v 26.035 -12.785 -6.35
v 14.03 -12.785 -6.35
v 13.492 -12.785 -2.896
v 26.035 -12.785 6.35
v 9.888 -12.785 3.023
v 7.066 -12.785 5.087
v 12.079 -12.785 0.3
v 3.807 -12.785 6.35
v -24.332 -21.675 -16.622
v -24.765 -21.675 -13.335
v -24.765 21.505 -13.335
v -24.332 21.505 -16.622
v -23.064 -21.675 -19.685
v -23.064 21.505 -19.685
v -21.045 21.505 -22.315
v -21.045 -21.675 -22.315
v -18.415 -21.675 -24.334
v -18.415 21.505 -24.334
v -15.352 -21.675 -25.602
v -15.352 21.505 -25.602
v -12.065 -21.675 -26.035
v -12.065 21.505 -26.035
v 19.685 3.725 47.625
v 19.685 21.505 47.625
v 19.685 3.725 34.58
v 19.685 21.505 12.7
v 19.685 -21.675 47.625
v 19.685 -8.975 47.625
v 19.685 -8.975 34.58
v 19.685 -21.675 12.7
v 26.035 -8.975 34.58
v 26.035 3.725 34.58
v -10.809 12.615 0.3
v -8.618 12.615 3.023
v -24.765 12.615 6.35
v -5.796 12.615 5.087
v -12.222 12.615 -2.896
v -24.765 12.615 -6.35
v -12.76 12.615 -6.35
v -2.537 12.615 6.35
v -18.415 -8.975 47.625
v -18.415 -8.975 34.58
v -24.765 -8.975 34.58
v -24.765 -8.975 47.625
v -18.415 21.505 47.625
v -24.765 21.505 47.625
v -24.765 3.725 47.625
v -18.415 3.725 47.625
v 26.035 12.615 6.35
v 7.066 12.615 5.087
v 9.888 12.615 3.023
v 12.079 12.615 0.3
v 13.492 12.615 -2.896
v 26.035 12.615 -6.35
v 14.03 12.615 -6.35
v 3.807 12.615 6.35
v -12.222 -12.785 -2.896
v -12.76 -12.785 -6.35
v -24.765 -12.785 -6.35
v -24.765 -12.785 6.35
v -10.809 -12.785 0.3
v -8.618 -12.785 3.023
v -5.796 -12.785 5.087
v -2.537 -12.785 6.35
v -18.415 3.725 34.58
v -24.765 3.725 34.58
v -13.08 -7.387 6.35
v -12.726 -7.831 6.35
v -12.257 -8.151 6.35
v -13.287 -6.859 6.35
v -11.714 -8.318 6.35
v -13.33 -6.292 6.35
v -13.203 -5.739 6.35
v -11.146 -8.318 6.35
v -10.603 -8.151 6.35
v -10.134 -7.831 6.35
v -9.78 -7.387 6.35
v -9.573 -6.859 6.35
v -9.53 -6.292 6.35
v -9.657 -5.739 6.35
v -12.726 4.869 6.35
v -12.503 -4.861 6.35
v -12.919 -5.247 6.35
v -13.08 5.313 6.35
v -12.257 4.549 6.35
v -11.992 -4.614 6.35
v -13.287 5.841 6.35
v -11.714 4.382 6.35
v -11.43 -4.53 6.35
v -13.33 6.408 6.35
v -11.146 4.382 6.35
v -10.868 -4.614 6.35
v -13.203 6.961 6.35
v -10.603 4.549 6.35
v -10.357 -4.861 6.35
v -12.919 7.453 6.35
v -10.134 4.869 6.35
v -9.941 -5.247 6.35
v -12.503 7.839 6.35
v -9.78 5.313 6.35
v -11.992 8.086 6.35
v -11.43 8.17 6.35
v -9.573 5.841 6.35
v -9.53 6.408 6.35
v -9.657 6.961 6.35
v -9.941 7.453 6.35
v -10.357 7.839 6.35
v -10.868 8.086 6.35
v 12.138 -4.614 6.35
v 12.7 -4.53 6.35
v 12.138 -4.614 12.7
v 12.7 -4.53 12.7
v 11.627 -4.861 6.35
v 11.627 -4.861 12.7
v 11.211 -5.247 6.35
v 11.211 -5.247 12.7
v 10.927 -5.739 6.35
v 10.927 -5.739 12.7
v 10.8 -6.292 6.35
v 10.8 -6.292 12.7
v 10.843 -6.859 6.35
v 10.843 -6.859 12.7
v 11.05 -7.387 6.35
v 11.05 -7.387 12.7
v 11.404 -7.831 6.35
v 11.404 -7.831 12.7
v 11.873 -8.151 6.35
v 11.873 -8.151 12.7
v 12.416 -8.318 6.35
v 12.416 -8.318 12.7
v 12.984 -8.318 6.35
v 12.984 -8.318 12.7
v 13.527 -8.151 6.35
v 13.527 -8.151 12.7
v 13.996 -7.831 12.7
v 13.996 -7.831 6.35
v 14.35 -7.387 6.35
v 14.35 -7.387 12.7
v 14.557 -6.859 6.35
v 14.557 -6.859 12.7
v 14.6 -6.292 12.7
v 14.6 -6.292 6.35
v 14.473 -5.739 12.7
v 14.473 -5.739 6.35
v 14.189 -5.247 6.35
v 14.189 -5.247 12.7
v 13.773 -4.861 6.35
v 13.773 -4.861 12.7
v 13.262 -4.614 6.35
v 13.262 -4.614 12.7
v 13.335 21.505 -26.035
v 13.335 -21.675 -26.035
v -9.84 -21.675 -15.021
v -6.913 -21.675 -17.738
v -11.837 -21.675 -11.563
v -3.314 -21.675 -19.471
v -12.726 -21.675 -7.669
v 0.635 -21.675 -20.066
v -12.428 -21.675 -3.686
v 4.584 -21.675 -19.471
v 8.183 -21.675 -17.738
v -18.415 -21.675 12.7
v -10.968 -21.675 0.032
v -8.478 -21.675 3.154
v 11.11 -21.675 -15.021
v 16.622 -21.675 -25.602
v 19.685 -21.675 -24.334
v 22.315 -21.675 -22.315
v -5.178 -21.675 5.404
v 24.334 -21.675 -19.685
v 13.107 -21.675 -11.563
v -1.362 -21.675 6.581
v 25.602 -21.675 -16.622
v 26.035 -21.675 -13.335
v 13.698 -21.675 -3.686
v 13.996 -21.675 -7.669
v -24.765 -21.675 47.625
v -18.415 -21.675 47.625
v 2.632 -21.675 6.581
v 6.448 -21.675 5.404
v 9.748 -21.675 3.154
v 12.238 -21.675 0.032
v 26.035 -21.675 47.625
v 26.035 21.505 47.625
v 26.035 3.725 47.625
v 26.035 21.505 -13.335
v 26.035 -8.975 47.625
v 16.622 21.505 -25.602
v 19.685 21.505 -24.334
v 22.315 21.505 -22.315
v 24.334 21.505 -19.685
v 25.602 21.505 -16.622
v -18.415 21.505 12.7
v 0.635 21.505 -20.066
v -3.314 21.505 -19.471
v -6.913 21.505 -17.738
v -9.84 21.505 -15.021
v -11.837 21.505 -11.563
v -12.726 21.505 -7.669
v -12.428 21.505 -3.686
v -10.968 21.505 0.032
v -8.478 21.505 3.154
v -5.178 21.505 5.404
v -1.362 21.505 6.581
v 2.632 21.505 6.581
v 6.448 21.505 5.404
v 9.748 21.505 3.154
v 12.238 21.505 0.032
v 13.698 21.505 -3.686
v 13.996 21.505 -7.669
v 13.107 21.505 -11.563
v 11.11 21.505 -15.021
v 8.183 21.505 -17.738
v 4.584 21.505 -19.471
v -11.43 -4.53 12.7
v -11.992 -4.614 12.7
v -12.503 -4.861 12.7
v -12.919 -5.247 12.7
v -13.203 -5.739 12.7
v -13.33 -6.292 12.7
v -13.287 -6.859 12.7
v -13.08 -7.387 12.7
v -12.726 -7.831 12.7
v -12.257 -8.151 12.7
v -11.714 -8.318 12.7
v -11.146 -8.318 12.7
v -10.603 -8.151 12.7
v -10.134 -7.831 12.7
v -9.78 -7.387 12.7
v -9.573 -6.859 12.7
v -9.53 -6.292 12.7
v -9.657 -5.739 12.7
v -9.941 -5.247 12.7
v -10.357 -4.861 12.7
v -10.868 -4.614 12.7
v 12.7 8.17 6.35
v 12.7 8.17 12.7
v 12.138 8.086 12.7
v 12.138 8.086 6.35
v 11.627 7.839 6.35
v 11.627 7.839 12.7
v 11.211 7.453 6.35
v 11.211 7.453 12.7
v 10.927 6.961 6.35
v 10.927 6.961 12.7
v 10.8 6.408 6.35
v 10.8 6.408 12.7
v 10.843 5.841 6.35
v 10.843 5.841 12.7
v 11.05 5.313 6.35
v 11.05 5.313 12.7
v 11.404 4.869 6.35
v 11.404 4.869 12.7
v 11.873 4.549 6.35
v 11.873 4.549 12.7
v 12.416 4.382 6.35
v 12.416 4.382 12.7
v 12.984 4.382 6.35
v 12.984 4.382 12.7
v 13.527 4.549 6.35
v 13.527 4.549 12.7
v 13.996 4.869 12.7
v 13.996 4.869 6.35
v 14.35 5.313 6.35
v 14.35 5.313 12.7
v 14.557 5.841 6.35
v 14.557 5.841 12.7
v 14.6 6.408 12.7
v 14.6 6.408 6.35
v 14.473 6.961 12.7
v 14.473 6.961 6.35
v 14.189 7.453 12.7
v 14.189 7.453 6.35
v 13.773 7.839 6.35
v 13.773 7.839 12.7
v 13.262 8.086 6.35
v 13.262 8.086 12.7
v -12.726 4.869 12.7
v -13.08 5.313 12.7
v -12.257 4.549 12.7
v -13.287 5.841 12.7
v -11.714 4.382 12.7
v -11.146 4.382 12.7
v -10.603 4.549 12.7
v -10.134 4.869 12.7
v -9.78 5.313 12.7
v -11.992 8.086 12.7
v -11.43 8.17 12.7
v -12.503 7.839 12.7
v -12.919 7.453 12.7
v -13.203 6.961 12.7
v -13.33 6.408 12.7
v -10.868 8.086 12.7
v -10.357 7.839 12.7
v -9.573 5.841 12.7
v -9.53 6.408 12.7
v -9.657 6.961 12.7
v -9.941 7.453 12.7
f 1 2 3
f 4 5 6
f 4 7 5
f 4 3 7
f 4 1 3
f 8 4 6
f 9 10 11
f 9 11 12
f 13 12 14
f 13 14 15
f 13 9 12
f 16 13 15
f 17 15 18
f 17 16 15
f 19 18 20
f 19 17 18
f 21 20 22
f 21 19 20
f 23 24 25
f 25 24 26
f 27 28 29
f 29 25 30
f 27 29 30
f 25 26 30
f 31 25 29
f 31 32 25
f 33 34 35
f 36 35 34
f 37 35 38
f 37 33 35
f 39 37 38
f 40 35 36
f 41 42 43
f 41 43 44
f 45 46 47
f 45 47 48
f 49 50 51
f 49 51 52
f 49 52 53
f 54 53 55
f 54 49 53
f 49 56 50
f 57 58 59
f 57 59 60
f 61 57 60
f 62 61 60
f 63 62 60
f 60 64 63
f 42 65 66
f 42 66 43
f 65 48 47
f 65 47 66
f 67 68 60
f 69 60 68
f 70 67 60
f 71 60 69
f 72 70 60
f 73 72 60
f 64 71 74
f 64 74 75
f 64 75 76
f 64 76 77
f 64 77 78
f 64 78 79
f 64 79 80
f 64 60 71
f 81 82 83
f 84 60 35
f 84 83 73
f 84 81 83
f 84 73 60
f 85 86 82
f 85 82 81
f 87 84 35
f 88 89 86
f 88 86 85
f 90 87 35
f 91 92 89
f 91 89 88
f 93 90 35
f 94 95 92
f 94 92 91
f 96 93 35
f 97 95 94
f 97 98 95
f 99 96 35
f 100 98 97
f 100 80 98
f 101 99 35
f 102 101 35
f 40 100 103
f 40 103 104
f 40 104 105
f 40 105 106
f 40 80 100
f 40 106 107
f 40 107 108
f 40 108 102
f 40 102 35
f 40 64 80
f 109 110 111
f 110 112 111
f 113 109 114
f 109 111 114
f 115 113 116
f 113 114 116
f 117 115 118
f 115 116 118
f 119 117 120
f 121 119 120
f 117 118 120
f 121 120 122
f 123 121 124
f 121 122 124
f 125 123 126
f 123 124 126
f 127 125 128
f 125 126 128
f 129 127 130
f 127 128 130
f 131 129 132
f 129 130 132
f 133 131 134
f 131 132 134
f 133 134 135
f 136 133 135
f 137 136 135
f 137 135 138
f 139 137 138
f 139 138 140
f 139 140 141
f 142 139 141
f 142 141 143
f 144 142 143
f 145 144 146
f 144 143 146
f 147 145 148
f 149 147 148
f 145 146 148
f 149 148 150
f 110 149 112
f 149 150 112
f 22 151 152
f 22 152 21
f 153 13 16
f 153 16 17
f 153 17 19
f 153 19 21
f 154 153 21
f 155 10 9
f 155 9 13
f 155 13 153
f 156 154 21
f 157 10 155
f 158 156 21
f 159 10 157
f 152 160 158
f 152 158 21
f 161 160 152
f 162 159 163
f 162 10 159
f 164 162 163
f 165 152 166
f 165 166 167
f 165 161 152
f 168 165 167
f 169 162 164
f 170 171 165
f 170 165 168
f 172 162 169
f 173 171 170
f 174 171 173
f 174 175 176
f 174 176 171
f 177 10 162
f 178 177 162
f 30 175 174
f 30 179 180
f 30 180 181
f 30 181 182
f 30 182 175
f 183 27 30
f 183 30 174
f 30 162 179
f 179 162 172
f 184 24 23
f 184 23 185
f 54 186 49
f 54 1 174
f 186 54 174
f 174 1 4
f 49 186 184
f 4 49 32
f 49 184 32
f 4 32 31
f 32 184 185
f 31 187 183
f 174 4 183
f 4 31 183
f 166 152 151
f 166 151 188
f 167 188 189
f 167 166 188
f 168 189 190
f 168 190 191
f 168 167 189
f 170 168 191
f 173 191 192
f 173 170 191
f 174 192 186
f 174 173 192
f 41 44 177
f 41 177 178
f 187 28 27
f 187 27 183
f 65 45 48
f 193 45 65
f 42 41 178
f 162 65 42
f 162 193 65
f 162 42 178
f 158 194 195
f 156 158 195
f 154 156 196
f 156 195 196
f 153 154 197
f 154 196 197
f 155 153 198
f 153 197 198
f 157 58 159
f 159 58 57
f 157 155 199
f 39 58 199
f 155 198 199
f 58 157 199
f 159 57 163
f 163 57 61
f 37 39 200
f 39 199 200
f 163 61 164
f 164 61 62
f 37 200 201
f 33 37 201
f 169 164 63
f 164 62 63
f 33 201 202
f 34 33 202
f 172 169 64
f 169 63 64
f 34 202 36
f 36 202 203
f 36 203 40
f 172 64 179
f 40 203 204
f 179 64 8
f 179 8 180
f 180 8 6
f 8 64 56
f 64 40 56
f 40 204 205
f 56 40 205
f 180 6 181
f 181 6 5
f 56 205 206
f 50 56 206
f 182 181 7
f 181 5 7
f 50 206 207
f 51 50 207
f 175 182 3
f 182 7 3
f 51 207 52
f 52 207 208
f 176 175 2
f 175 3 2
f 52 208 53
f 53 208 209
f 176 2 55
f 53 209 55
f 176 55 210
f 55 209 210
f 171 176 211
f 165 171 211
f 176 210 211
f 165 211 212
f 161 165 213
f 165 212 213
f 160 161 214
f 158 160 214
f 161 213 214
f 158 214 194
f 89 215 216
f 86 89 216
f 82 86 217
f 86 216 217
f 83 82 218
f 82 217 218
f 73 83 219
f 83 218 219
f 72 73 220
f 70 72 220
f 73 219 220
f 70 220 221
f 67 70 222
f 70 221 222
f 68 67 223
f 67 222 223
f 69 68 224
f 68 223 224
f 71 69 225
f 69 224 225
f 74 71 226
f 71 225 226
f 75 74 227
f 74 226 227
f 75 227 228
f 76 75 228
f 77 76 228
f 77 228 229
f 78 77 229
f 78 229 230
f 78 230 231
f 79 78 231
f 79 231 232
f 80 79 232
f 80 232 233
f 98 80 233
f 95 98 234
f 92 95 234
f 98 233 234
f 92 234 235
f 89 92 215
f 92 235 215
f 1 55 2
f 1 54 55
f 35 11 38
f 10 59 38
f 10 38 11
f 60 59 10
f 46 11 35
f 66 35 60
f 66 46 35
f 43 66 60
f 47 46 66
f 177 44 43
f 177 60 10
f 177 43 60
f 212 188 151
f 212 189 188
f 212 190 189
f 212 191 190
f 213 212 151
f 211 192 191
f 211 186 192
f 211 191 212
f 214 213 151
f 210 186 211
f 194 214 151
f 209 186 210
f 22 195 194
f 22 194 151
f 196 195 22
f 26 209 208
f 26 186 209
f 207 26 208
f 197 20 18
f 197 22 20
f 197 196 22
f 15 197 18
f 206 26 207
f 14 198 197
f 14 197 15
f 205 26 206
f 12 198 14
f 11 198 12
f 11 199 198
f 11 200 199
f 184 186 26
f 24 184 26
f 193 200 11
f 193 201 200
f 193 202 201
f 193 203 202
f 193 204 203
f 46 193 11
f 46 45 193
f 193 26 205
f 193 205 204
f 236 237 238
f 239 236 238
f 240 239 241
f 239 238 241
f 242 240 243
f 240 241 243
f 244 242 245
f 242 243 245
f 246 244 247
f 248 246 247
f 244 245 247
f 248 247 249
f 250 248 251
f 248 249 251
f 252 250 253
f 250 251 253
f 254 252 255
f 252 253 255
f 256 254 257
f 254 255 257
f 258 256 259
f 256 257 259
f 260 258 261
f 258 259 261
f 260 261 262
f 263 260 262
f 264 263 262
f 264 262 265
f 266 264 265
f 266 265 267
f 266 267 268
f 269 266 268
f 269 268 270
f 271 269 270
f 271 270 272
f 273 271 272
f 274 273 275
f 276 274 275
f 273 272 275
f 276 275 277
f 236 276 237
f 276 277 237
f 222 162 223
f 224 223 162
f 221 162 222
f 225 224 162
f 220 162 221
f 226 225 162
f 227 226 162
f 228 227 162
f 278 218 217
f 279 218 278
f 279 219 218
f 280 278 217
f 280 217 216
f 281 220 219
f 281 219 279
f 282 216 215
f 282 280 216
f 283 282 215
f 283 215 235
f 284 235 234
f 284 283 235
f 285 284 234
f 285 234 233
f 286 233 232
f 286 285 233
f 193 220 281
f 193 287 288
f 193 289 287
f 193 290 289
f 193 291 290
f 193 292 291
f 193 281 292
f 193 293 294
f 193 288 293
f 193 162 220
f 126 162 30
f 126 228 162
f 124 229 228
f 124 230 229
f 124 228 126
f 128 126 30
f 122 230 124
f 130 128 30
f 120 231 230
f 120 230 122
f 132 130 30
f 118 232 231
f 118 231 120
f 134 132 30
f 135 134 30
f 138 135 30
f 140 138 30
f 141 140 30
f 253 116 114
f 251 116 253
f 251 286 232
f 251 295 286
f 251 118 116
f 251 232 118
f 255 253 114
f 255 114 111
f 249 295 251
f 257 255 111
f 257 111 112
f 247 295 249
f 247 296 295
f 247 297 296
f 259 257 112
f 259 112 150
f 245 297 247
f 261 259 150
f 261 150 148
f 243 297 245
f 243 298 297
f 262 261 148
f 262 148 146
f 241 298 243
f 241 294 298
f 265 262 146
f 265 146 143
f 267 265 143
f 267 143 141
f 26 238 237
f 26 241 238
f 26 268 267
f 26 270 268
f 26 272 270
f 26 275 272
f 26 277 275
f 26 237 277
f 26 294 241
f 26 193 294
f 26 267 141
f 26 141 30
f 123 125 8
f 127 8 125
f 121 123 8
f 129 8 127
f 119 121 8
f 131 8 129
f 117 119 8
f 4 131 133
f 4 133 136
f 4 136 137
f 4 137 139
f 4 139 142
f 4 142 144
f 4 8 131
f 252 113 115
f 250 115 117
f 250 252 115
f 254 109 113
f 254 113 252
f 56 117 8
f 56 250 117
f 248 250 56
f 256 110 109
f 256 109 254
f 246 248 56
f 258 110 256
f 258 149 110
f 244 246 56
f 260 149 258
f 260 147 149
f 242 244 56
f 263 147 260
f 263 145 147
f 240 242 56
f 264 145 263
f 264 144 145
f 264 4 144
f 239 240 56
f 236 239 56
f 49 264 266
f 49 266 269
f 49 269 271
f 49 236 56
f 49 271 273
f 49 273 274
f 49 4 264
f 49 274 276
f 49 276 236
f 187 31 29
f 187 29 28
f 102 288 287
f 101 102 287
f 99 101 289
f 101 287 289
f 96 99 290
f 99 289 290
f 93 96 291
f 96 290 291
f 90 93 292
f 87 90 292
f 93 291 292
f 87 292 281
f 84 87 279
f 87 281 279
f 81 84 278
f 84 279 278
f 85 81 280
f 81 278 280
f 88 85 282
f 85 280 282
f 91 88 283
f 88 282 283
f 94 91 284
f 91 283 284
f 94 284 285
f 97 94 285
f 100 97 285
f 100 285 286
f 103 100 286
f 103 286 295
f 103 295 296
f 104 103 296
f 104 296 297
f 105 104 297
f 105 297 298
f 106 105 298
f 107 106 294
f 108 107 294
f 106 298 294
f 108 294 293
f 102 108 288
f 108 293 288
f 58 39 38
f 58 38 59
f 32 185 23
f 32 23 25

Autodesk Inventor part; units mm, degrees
ref_plane "YZ Plane" through (0, 0, 0) normal (1, 0, 0) x (0, 1, 0)
ref_plane "XZ Plane" through (0, 0, 0) normal (0, 1, 0) x (-1, 0, 0)
ref_plane "XY Plane" through (0, 0, 0) normal (0, 0, 1) x (1, 0, 0)
sketch "Sketch1" plane through (0, 0, 0) normal (0, 0, 1) x (1, 0, 0)
  line L0 (-15.24, 10.0753) -> (16.51, 10.0753)
  line L1 (16.51, 10.0753) -> (16.51, -15.3247)
  line L2 (16.51, -15.3247) -> (-15.24, -15.3247)
  line L3 (-15.24, -15.3247) -> (-15.24, 10.0753)
  circle A0 centre (-11.43, 6.2653) radius 1.905
  circle A1 centre (-11.43, -6.4347) radius 1.905
  circle A2 centre (12.7, 6.2653) radius 1.905
  circle A3 centre (12.7, -6.4347) radius 1.905
  point P0 (0, 0)
  dimension "d0" = 31.75
  dimension "d1" = 25.4
  dimension "d10" = 3.81
  dimension "d11" = 8.89
  dimension "d12" = 3.81
  dimension "d13" = 3.81
  dimension "d14" = 8.89
  dimension "d15" = 3.81
  dimension "d16" = 3.81
  dimension "d17" = 3.81
  dimension "d18" = 3.81
  dimension "d19" = 3.81
  dimension "d20" = 3.81
  dimension "d21" = 3.81
  dimension "d22" = 8.89
extrude "Extrusion1" add sketch "Sketch1" along normal blind 6.35
sketch "Sketch2" plane through (0, 0, 6.35) normal (0, 0, 1) x (1, 0, 0)
  line L0 (-24.765, 16.4253) -> (26.035, 16.4253)
  line L1 (26.035, 16.4253) -> (26.035, -21.6747)
  line L2 (26.035, -21.6747) -> (-24.765, -21.6747)
  line L3 (-24.765, -21.6747) -> (-24.765, 16.4253)
  line L4 (16.51, -15.3247) -> (16.51, 10.0753) projected
  line L5 (-15.24, 10.0753) -> (-15.24, -15.3247) projected
  line L6 (16.51, 10.0753) -> (-15.24, 10.0753) projected
  point P0 (0, 0)
  dimension "d25" = 50.8
  dimension "d26" = 38.1
  dimension "d27" = 9.525
  dimension "d29" = 9.525
  dimension "d30" = 6.35
extrude "Extrusion2" add sketch "Sketch2" along normal blind 6.35
sketch "Sketch3" plane through (0, 0, 6.35) normal (0, 0, -1) x (-1, 0, 0)
  line L0 (24.765, -21.6747) -> (24.765, 16.4253) projected
  circle A0 centre (11.43, 6.2653) radius 1.905 projected
  line L1 (24.765, 16.4253) -> (-26.035, 16.4253) projected
  circle A1 centre (11.43, -6.4347) radius 1.905 projected
  line L2 (-26.035, -21.6747) -> (24.765, -21.6747) projected
  line L3 (-26.035, 16.4253) -> (-26.035, -21.6747) projected
  point P0 (0, 0)
  point P1 (-12.7, -6.4347)
  point P2 (-12.7, 6.2653)
  dimension "d33" = 13.335
  dimension "d34" = 10.16
  dimension "d35" = 13.335
  dimension "d36" = 15.24
  dimension "d37" = 13.335
  dimension "d38" = 10.16
  dimension "d39" = 15.24
  dimension "d40" = 13.335
hole "Hole1" at (-11.43, 6.2653, 6.35) at (-11.43, -6.4347, 6.35) at (12.7, -6.4347, 6.35) at (12.7, 6.2653, 6.35) direction (0, 0, 1) diameter 3.81 end through all
sketch "Sketch4" plane through (0, 0, 12.7) normal (0, 0, 1) x (1, 0, 0)
  line L0 (26.035, 16.4253) -> (26.035, -21.6747) projected
  line L1 (26.035, 16.4253) -> (19.685, 16.4253)
  line L2 (19.685, 16.4253) -> (19.685, -21.6747)
  line L3 (19.685, -21.6747) -> (26.035, -21.6747)
  line L4 (26.035, -21.6747) -> (26.035, 16.4253)
  line L5 (-24.765, 16.4253) -> (26.035, 16.4253) projected
  line L6 (-24.765, 16.4253) -> (-18.415, 16.4253)
  line L7 (-18.415, 16.4253) -> (-18.415, -21.6747)
  line L8 (-18.415, -21.6747) -> (-24.765, -21.6747)
  line L9 (-24.765, -21.6747) -> (-24.765, 16.4253)
  point P0 (0, 0)
  dimension "d48" = 6.35
  dimension "d49" = 6.35
extrude "Extrusion3" add sketch "Sketch4" along normal blind 34.925
sketch "Sketch5" plane through (26.035, -21.6747, 6.35) normal (1, 0, 0) x (0, 0, -1)
  line L0 (-41.2903, 25.4) -> (-28.2305, 25.4)
  line L1 (-28.2305, 25.4) -> (-28.2305, 12.7)
  line L2 (-28.2305, 12.7) -> (-41.2903, 12.7)
  line L3 (-41.2903, 12.7) -> (-41.2903, 25.4)
  line L4 (0, 38.1) -> (-41.275, 38.1) projected
  point P0 (6.35, 21.6747)
  dimension "d52" = 12.7
  dimension "d53" = 12.7
extrude "Extrusion4" cut sketch "Sketch5" against normal through all
sketch "Sketch6" plane through (0, 0, 6.35) normal (0, 0, -1) x (-1, 0, 0)
  point P0 (0, 0)
sketch "Sketch7" plane through (0, 0, 6.35) normal (0, 0, -1) x (-1, 0, 0)
  line L0 (-26.035, 16.4253) -> (-26.035, -21.6747) projected
  line L1 (24.765, -21.6747) -> (18.415, -21.6747) projected
  line L2 (-26.035, 16.4253) -> (24.765, 16.4253)
  line L3 (24.765, 16.4253) -> (24.765, -21.6747)
  line L4 (24.765, -21.6747) -> (-26.035, -21.6747)
  line L5 (-26.035, -21.6747) -> (-26.035, 16.4253)
  point P0 (0, 0)
extrude "Extrusion5" add sketch "Sketch7" along normal blind 32.385
sketch "Sketch8" plane through (-18.415, -21.6747, 12.7) normal (0, -1, 0) x (1, 0, 0)
  line L0 (44.45, -38.735) -> (-6.35, -38.735) projected
  line L1 (44.45, 34.925) -> (44.45, -38.735) projected
  line L2 (0, 0) -> (38.1, 0) projected
  line L3 (-6.35, 34.925) -> (-6.35, -38.735) projected
  point P0 (18.415, -12.7)
  point P1 (19.05, -19.3675)
  dimension "d60" = 19.3675
  dimension "d61" = 25.4
  dimension "d62" = 19.3675
  dimension "d63" = 25.4
hole "Hole2" at (0.635, -21.6747, -6.6675) direction (0, 1, 0) diameter 26.797 end through all
fillet "Fillet3" radius 12.7 2 edges at (-24.765, -2.6247, -26.035) (26.035, -2.6247, -26.035)
sketch "Sketch9" plane through (0, 0, 12.7) normal (0, 0, 1) x (1, 0, 0)
  circle A0 centre (12.7, -6.4347) radius 1.905
  circle A1 centre (-11.43, -6.4347) radius 1.905
  circle A2 centre (-11.43, 6.2653) radius 1.905
  line L0 (-18.415, -21.6747) -> (19.685, -21.6747) projected
  line L1 (26.035, 3.7253) -> (26.035, -8.9747) projected
  circle A3 centre (12.7, 6.2653) radius 1.905 projected
  circle A4 centre (-11.43, -6.4347) radius 1.905 projected
  circle A5 centre (12.7, 6.2653) radius 1.905
  line L2 (19.685, 16.4253) -> (-18.415, 16.4253) projected
  point P0 (0, 0)
  dimension "d73" = 15.24
  dimension "d74" = 13.335
  dimension "d75" = 12.7
  dimension "d76" = 24.13
  dimension "d77" = 24.13
  dimension "d78" = 3.81
  dimension "d79" = 3.81
  dimension "d80" = 12.7
  dimension "d81" = 3.81
  dimension "d82" = 10.16
  dimension "d83" = 24.13
extrude "Extrusion6" cut sketch "Sketch9" against normal blind 19.05
sketch "Sketch10" plane through (26.035, 3.7253, 47.625) normal (1, 0, 0) x (0, 0, -1)
  line L0 (41.275, 8.89) -> (53.975, 8.89)
  line L1 (53.975, 8.89) -> (53.975, -16.51)
  line L2 (53.975, -16.51) -> (41.275, -16.51)
  line L3 (41.275, -16.51) -> (41.275, 8.89)
  line L4 (34.925, -25.4) -> (34.925, 12.7) projected
  line L5 (0, 12.7) -> (60.96, 12.7) projected
  point P0 (47.625, -3.7253)
  dimension "d86" = 12.7
  dimension "d87" = 25.4
  dimension "d88" = 6.35
  dimension "d91" = 3.81
extrude "Extrusion7" cut sketch "Sketch10" against normal through all
thicken "Thicken1" operation add thickness 5.08 both sides no extend neighbours yes toward (0, 1, 0) faces at (-22.6483, 16.4253, 15.6633)
sketch "Sketch11" plane through (-18.415, 21.5053, 12.7) normal (0, 1, 0) x (1, 0, 0)
  point P0 (18.415, 12.7)
sketch "Sketch12" plane through (-24.765, -21.6747, 47.625) normal (-1, 0, 0) x (0, 0, 1)
  line L0 (-60.96, 43.18) -> (0, 43.18) projected
  line L1 (0, 0) -> (-60.96, 0) projected
  point P0 (-47.625, 21.6747)
sketch "Sketch13" plane through (-18.415, 21.5053, 12.7) normal (0, 1, 0) x (1, 0, 0)
  line L0 (44.45, -34.925) -> (44.45, 26.035) projected
  line L1 (-6.35, 26.035) -> (-6.35, -34.925) projected
  point P0 (18.415, 12.7)
  dimension "d95" = 50.8
equation "\"d12\" = d13"
equation "\"d15\" = d10"
equation "\"d16\" = d10"
equation "\"d17\" = d10"
equation "\"d19\" = d13"
equation "\"d20\" = d13"
equation "\"d21\" = d20"
equation "\"d22\" = d14"
equation "\"d37\" = d33"
equation "\"d38\" = d34"
equation "\"d39\" = d36"
equation "\"d40\" = d35"
equation "\"d77\" = d76"
equation "\"d79\" = d78"
properties part number "Vertical Seeder Rod spacer"
